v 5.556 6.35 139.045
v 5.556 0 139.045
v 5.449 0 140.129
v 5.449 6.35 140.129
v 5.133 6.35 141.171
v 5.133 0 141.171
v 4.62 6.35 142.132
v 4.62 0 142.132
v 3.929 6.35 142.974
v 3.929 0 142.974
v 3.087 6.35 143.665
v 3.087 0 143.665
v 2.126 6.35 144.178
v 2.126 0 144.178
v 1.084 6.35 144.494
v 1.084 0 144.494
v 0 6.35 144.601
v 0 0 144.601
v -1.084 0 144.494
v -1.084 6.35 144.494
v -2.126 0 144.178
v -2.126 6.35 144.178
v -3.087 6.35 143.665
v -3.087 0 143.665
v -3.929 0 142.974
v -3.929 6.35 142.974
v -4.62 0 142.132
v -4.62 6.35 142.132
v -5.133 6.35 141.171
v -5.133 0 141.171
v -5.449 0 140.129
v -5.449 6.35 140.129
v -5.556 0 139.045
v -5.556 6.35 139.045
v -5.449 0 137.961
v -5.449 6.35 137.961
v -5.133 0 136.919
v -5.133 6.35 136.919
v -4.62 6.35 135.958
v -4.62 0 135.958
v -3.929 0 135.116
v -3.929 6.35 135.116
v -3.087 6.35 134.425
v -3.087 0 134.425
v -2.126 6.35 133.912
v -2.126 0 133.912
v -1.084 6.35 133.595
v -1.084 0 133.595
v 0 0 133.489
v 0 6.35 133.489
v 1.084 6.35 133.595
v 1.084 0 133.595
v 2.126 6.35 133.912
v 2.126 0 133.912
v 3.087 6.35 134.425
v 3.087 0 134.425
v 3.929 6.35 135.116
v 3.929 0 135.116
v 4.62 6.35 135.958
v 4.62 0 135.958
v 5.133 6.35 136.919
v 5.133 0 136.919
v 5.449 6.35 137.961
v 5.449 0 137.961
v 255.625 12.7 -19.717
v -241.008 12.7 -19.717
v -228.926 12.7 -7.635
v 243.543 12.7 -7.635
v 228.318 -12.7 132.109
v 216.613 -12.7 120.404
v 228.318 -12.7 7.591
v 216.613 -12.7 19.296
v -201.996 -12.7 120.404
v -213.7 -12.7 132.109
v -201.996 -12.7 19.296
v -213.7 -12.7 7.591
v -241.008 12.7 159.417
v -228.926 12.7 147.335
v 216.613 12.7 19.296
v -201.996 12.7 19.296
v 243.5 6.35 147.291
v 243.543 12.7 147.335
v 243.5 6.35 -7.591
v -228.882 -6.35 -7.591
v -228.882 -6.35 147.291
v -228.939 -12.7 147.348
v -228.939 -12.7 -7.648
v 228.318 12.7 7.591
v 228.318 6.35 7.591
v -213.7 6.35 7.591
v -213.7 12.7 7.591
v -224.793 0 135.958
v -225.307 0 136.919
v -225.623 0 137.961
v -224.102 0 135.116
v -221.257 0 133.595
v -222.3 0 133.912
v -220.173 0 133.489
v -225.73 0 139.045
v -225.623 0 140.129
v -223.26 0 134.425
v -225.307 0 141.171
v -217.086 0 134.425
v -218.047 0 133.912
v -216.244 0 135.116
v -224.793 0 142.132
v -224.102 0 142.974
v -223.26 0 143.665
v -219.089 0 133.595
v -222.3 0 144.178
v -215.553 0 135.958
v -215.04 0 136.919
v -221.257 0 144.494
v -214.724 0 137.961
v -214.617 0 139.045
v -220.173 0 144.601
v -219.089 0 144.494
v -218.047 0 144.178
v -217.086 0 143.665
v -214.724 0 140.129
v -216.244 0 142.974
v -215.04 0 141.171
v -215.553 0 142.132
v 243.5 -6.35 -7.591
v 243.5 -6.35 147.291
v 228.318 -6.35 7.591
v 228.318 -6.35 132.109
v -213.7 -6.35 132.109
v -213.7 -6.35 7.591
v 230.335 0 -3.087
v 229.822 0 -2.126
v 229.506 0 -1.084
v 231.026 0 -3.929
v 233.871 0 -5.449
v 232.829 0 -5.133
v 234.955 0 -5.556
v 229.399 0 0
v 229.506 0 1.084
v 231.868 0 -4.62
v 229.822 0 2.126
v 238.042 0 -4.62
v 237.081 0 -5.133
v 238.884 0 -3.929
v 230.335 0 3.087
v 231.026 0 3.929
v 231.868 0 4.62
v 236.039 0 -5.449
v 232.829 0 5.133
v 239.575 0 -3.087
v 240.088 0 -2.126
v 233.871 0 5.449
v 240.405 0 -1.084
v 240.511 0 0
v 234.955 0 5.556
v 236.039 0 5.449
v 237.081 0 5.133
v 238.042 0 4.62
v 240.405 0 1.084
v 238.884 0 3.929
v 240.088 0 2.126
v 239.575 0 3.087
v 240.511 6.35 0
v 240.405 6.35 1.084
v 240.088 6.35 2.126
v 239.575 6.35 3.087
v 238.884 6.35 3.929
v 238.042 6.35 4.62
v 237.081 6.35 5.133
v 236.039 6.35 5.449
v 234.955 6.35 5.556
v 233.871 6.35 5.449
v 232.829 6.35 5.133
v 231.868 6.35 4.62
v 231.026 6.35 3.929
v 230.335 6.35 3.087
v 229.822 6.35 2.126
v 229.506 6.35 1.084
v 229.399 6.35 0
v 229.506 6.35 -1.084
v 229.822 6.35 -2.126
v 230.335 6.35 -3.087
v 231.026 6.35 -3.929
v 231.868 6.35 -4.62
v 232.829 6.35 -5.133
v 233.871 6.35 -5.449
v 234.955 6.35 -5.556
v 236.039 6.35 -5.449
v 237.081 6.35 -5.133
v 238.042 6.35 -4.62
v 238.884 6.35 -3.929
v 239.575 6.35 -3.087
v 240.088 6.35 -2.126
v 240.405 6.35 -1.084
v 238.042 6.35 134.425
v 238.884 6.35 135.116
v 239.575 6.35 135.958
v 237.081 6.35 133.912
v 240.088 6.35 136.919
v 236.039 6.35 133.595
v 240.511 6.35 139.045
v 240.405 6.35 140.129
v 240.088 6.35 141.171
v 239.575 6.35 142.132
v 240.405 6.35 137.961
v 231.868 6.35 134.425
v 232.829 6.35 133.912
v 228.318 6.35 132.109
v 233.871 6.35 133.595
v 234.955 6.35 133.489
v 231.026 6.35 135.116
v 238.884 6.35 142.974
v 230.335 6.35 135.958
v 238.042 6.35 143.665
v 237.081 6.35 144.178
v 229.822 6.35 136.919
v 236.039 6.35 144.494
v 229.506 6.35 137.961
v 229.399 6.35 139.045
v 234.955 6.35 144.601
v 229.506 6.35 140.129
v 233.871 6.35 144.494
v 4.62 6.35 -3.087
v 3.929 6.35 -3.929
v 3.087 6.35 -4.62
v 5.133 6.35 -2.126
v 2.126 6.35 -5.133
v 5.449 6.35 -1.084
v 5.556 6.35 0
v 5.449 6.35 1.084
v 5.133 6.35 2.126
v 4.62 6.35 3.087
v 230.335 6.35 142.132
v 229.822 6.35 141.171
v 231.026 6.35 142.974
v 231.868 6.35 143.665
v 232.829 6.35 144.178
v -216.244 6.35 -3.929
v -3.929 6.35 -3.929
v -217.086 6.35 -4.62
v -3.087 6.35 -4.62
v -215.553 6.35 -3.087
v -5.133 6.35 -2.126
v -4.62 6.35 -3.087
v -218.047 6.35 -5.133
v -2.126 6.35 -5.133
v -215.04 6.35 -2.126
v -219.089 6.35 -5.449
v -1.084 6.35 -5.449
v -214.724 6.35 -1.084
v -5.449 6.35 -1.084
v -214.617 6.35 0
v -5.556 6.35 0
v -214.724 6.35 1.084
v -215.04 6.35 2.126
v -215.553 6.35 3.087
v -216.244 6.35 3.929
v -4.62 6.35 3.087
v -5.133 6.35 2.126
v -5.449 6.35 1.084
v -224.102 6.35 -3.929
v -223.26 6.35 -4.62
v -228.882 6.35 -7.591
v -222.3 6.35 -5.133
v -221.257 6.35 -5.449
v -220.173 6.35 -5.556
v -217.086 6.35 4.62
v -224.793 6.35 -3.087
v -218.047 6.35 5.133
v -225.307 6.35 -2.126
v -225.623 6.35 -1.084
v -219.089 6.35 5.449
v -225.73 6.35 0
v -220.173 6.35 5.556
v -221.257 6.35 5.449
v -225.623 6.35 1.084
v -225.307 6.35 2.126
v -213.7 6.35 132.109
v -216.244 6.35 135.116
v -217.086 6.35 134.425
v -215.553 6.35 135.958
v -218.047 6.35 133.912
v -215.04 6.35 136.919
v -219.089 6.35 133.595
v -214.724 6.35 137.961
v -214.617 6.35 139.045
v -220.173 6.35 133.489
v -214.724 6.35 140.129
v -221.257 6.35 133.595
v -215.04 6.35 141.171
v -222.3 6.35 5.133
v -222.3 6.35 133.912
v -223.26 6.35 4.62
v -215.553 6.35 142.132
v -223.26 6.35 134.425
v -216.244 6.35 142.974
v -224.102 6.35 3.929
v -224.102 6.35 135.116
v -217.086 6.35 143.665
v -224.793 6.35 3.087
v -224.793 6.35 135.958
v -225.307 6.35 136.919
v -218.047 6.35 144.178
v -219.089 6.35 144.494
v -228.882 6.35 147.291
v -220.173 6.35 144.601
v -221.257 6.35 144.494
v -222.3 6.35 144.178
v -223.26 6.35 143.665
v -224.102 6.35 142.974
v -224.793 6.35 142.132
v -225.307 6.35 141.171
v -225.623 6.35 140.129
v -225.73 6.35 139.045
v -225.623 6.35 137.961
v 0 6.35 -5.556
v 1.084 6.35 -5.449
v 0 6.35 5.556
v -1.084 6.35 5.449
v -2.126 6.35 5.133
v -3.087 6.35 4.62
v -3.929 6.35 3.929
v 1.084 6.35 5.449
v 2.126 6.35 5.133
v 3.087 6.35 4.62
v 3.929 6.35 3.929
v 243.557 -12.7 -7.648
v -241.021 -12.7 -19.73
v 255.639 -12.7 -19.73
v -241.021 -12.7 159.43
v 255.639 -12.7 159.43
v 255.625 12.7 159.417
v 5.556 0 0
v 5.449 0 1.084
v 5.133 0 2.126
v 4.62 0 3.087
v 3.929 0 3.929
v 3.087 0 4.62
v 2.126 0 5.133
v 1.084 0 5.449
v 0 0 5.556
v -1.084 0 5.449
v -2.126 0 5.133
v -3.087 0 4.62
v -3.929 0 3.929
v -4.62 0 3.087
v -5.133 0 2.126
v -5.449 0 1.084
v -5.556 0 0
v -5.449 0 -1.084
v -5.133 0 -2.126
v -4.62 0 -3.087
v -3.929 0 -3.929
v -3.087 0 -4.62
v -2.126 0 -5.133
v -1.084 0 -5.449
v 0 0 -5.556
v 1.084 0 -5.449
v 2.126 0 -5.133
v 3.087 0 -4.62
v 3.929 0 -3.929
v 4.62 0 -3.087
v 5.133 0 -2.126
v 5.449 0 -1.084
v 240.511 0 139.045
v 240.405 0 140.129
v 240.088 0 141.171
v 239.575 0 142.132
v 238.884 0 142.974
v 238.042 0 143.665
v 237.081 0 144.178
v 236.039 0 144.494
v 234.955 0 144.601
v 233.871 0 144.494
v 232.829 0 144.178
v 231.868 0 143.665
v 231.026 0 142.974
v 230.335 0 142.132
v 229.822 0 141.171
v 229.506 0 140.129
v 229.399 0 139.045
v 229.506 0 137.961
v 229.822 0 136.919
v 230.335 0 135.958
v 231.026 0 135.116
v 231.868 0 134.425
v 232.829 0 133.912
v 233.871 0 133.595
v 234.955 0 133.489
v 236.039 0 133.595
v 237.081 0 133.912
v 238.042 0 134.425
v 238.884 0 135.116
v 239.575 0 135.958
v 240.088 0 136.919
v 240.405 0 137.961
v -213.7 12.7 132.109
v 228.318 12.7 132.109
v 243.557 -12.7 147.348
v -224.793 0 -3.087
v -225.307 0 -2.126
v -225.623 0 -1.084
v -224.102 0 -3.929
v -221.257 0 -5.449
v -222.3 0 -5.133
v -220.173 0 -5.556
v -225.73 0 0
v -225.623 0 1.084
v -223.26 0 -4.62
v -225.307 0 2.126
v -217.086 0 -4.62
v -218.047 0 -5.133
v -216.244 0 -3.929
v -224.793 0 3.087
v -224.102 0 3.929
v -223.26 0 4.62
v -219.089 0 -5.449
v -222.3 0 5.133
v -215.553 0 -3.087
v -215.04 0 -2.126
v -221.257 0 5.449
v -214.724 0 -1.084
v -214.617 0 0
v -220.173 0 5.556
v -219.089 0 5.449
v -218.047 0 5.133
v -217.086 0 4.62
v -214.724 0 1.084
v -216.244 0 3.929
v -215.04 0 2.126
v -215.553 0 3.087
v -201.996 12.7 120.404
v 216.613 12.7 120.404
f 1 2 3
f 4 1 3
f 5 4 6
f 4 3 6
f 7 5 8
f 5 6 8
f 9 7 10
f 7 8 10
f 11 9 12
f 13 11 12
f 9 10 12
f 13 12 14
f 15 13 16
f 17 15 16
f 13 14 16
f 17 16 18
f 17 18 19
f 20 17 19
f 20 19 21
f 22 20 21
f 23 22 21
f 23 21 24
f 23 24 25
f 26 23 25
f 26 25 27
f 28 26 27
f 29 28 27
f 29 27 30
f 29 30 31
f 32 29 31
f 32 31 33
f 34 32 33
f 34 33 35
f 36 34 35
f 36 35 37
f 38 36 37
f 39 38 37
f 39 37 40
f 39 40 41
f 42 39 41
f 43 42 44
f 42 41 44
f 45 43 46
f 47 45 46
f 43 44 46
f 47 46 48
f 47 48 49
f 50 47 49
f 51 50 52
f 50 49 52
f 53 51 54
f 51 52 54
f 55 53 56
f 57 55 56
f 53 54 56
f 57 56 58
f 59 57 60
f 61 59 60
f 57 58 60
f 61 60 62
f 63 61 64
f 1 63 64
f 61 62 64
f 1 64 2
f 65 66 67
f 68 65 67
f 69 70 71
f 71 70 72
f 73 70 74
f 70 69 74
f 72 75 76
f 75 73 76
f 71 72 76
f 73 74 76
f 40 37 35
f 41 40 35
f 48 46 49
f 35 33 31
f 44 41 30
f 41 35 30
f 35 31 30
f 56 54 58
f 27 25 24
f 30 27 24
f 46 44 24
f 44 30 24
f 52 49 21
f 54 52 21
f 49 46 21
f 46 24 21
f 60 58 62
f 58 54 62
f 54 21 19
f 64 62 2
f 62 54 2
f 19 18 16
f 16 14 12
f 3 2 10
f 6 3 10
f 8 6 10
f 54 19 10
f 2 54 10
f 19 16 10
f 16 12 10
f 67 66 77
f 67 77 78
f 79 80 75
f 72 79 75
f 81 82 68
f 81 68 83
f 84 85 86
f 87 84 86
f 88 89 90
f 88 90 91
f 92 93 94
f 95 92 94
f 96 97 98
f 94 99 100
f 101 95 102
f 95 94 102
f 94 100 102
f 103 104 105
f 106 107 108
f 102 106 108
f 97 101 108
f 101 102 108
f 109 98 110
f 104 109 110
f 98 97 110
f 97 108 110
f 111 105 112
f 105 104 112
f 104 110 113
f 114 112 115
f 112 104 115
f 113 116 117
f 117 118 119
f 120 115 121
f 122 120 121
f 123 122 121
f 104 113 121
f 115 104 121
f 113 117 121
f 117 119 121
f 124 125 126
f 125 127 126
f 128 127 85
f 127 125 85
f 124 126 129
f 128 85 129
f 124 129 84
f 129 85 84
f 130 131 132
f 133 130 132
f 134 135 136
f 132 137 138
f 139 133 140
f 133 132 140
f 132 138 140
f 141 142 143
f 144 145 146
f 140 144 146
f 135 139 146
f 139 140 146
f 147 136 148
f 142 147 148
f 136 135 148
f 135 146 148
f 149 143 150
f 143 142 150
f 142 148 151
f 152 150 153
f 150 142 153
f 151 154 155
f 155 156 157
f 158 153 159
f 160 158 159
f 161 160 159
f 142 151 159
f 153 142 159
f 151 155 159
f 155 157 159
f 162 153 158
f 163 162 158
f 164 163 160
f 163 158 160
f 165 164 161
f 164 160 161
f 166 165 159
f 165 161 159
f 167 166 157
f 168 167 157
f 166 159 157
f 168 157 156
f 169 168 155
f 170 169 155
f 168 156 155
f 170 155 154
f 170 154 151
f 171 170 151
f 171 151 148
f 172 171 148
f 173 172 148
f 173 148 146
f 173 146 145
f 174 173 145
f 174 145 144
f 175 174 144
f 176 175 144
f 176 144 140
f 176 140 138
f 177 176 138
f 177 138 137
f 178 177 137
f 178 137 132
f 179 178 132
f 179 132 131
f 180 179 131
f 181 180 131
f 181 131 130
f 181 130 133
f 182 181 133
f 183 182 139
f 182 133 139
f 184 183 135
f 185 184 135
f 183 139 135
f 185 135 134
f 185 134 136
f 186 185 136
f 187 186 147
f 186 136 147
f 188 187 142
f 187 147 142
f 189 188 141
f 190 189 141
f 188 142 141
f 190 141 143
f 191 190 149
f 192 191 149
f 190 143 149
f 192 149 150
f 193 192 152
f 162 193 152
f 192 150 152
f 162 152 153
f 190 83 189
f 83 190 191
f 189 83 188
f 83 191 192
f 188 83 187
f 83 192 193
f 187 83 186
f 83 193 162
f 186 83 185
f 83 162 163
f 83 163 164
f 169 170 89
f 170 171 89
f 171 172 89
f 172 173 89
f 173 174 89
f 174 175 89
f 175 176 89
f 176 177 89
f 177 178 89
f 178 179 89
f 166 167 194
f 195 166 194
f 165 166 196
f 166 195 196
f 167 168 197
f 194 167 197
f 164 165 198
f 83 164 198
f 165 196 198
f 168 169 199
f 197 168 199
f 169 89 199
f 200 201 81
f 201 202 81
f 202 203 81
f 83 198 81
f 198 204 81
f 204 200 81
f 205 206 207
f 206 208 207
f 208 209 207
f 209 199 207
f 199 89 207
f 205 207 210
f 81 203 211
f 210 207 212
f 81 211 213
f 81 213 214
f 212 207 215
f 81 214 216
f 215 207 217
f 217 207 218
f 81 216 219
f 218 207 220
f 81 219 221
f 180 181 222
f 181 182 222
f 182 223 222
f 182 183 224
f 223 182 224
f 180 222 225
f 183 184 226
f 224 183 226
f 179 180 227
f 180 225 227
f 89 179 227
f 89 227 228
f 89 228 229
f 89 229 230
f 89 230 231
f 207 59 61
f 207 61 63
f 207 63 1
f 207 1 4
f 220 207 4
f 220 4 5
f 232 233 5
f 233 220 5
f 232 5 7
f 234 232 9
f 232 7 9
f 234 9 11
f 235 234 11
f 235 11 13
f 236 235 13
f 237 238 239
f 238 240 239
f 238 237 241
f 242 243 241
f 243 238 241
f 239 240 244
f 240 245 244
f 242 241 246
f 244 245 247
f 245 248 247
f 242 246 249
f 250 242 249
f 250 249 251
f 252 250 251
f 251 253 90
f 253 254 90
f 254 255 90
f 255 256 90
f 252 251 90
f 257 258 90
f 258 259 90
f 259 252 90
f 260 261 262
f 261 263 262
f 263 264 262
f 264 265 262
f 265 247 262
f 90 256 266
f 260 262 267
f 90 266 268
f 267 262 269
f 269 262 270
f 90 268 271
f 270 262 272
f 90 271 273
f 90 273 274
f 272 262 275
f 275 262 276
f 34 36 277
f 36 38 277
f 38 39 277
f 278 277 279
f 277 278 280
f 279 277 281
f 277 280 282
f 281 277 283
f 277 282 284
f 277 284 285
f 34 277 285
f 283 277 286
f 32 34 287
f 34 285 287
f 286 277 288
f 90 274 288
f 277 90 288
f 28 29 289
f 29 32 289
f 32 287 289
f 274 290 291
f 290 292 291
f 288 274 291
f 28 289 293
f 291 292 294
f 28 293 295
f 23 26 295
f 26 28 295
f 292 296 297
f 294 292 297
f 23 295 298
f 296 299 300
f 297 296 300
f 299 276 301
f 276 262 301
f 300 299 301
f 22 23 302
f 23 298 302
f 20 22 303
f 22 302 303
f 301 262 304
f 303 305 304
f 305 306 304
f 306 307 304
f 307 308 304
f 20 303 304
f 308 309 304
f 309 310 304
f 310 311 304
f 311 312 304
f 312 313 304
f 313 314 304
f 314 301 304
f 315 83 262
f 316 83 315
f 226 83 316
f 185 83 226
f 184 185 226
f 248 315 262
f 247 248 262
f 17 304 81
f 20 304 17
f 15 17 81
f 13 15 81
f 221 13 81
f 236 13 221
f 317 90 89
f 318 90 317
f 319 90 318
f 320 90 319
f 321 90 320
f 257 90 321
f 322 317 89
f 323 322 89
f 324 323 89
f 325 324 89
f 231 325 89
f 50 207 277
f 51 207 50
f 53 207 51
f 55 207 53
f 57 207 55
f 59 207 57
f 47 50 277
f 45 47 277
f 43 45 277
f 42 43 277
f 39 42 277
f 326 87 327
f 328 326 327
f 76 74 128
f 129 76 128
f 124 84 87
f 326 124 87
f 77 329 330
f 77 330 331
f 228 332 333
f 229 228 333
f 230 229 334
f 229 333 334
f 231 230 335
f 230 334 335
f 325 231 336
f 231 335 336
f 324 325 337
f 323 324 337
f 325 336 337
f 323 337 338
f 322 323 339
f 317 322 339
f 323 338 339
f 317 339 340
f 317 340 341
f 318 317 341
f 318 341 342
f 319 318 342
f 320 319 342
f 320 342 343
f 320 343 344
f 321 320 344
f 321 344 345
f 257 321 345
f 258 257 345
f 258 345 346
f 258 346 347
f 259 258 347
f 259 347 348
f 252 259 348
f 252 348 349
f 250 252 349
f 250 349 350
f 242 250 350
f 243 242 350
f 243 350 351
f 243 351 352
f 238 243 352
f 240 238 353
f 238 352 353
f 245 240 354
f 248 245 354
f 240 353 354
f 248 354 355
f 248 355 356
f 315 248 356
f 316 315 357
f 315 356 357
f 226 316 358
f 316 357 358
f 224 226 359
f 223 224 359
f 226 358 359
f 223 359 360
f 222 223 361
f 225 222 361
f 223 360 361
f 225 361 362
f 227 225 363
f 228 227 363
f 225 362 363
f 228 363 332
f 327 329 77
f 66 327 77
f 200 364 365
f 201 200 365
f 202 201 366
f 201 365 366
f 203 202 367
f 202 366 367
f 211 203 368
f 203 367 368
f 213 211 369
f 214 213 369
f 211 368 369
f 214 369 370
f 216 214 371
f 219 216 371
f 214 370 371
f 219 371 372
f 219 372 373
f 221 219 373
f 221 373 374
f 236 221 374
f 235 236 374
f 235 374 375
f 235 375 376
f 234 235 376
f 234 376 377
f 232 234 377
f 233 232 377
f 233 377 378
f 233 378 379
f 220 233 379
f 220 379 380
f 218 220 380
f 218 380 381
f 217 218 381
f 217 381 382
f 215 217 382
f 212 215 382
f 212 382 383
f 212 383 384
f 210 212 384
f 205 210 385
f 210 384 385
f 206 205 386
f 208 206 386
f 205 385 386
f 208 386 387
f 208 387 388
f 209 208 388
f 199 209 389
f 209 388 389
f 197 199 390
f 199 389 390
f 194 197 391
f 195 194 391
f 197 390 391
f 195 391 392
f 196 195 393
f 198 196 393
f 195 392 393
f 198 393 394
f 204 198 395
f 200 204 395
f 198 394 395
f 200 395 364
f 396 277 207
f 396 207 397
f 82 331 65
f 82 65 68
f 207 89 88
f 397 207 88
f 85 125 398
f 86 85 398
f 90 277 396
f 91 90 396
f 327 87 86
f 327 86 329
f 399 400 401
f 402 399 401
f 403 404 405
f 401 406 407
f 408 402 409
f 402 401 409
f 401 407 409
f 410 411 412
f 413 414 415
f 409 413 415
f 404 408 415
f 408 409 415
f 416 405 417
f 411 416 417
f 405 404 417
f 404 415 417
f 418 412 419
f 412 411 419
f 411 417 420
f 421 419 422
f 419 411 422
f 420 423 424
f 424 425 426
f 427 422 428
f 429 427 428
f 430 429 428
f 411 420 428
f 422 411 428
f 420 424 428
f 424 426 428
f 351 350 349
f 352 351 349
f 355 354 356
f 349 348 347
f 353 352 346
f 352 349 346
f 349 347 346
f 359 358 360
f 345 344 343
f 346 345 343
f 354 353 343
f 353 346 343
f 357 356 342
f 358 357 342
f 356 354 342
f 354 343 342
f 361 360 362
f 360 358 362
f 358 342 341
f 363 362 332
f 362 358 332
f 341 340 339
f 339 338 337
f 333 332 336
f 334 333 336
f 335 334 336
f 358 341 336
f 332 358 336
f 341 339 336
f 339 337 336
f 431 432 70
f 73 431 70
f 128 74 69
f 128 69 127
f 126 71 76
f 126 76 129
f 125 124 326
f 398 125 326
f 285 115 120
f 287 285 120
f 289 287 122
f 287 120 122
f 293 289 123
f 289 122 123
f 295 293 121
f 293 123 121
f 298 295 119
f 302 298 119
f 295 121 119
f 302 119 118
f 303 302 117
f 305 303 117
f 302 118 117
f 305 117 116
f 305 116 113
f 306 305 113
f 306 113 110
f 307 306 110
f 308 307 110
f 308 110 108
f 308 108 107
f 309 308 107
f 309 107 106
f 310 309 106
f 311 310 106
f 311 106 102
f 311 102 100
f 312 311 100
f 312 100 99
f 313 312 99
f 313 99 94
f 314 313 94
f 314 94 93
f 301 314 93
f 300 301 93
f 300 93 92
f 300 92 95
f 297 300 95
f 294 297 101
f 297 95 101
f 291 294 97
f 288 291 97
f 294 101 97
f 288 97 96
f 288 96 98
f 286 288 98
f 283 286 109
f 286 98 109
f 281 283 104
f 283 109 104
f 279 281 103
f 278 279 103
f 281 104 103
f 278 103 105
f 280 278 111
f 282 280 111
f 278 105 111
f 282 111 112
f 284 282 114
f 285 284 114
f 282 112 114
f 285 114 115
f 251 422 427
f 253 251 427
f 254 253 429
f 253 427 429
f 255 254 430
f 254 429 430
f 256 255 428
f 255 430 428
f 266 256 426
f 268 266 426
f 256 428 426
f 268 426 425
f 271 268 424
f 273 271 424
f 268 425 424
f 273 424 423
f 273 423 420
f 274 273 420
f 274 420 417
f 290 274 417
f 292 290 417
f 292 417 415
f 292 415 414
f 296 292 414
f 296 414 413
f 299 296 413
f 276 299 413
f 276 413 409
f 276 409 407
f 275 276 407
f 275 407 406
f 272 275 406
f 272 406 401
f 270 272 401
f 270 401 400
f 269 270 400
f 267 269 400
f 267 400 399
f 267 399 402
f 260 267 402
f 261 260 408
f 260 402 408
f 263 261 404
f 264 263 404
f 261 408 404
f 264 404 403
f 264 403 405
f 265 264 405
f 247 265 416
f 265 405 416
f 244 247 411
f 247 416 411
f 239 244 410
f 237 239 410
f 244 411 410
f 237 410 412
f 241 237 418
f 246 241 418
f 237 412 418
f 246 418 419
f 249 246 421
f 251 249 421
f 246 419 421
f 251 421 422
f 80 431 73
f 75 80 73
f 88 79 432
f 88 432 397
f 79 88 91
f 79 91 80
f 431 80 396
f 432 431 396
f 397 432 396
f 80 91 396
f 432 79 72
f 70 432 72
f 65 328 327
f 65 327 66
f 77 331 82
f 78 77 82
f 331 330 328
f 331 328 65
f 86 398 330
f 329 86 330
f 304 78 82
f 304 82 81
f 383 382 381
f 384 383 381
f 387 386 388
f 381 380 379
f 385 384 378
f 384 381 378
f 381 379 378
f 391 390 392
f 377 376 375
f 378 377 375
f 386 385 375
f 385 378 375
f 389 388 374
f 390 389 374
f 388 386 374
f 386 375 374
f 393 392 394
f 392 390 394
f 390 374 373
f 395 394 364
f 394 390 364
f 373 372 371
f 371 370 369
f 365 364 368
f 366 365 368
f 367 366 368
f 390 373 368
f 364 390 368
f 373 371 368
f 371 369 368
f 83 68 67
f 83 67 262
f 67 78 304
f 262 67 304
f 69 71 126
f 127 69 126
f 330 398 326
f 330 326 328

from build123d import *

# Parameters (mm, degrees)
F4_D     = 11.1125
F4_DEPTH = 12.7011486273


# Not quite as in the source:
# - a length typed as a fraction of an inch, garbled in the dataset ("3 / 203.2 mm" for 3/8 in), is restored


with BuildPart() as f2:
    # F2: sweep along a path in F1
    with BuildLine(Plane.XZ) as f2_path:
        Line((235.9086840398, 0), (0, 0))
        Line((0, 0), (-221.2913159602, 0))
        Line((-221.2913159602, 0), (-221.2913159602, 139.7))
        Line((-221.2913159602, 139.7), (235.9086840398, 139.7))
        Line((235.9086840398, 139.7), (235.9086840398, 0))
    # F0 (on Right) → F2 (sweep)
    with BuildSketch(Plane.YZ):
        Polygon((-6.35, 7.5911765571), (-6.35, -7.5911765571), (-12.7001486273, -7.648065583), (-12.6998513727, -19.7300187742), (12.7001486273, -19.7165756275), (12.6998513727, -7.6346224362), (6.35, -7.5911765571), (6.35, 7.5911765571), (12.7, 7.5911765571), (12.7, 19.2955805858), (-12.7, 19.2955805858), (-12.7, 7.5911765571), align=None)
    sweep(path=f2_path.line, transition=Transition.RIGHT)

    # F4 (through all, one way)
    with BuildSketch(Plane.XZ):
        with Locations((-220.1733291149, 139.0449106693), (-220.1733291149, 0), (0, 139.0449106693), (0, 0), (234.9551618099, 139.0449106693), (234.9551618099, 0)):
            Circle(F4_D / 2)
    extrude(amount=-F4_DEPTH, mode=Mode.SUBTRACT)


solid = f2.part
